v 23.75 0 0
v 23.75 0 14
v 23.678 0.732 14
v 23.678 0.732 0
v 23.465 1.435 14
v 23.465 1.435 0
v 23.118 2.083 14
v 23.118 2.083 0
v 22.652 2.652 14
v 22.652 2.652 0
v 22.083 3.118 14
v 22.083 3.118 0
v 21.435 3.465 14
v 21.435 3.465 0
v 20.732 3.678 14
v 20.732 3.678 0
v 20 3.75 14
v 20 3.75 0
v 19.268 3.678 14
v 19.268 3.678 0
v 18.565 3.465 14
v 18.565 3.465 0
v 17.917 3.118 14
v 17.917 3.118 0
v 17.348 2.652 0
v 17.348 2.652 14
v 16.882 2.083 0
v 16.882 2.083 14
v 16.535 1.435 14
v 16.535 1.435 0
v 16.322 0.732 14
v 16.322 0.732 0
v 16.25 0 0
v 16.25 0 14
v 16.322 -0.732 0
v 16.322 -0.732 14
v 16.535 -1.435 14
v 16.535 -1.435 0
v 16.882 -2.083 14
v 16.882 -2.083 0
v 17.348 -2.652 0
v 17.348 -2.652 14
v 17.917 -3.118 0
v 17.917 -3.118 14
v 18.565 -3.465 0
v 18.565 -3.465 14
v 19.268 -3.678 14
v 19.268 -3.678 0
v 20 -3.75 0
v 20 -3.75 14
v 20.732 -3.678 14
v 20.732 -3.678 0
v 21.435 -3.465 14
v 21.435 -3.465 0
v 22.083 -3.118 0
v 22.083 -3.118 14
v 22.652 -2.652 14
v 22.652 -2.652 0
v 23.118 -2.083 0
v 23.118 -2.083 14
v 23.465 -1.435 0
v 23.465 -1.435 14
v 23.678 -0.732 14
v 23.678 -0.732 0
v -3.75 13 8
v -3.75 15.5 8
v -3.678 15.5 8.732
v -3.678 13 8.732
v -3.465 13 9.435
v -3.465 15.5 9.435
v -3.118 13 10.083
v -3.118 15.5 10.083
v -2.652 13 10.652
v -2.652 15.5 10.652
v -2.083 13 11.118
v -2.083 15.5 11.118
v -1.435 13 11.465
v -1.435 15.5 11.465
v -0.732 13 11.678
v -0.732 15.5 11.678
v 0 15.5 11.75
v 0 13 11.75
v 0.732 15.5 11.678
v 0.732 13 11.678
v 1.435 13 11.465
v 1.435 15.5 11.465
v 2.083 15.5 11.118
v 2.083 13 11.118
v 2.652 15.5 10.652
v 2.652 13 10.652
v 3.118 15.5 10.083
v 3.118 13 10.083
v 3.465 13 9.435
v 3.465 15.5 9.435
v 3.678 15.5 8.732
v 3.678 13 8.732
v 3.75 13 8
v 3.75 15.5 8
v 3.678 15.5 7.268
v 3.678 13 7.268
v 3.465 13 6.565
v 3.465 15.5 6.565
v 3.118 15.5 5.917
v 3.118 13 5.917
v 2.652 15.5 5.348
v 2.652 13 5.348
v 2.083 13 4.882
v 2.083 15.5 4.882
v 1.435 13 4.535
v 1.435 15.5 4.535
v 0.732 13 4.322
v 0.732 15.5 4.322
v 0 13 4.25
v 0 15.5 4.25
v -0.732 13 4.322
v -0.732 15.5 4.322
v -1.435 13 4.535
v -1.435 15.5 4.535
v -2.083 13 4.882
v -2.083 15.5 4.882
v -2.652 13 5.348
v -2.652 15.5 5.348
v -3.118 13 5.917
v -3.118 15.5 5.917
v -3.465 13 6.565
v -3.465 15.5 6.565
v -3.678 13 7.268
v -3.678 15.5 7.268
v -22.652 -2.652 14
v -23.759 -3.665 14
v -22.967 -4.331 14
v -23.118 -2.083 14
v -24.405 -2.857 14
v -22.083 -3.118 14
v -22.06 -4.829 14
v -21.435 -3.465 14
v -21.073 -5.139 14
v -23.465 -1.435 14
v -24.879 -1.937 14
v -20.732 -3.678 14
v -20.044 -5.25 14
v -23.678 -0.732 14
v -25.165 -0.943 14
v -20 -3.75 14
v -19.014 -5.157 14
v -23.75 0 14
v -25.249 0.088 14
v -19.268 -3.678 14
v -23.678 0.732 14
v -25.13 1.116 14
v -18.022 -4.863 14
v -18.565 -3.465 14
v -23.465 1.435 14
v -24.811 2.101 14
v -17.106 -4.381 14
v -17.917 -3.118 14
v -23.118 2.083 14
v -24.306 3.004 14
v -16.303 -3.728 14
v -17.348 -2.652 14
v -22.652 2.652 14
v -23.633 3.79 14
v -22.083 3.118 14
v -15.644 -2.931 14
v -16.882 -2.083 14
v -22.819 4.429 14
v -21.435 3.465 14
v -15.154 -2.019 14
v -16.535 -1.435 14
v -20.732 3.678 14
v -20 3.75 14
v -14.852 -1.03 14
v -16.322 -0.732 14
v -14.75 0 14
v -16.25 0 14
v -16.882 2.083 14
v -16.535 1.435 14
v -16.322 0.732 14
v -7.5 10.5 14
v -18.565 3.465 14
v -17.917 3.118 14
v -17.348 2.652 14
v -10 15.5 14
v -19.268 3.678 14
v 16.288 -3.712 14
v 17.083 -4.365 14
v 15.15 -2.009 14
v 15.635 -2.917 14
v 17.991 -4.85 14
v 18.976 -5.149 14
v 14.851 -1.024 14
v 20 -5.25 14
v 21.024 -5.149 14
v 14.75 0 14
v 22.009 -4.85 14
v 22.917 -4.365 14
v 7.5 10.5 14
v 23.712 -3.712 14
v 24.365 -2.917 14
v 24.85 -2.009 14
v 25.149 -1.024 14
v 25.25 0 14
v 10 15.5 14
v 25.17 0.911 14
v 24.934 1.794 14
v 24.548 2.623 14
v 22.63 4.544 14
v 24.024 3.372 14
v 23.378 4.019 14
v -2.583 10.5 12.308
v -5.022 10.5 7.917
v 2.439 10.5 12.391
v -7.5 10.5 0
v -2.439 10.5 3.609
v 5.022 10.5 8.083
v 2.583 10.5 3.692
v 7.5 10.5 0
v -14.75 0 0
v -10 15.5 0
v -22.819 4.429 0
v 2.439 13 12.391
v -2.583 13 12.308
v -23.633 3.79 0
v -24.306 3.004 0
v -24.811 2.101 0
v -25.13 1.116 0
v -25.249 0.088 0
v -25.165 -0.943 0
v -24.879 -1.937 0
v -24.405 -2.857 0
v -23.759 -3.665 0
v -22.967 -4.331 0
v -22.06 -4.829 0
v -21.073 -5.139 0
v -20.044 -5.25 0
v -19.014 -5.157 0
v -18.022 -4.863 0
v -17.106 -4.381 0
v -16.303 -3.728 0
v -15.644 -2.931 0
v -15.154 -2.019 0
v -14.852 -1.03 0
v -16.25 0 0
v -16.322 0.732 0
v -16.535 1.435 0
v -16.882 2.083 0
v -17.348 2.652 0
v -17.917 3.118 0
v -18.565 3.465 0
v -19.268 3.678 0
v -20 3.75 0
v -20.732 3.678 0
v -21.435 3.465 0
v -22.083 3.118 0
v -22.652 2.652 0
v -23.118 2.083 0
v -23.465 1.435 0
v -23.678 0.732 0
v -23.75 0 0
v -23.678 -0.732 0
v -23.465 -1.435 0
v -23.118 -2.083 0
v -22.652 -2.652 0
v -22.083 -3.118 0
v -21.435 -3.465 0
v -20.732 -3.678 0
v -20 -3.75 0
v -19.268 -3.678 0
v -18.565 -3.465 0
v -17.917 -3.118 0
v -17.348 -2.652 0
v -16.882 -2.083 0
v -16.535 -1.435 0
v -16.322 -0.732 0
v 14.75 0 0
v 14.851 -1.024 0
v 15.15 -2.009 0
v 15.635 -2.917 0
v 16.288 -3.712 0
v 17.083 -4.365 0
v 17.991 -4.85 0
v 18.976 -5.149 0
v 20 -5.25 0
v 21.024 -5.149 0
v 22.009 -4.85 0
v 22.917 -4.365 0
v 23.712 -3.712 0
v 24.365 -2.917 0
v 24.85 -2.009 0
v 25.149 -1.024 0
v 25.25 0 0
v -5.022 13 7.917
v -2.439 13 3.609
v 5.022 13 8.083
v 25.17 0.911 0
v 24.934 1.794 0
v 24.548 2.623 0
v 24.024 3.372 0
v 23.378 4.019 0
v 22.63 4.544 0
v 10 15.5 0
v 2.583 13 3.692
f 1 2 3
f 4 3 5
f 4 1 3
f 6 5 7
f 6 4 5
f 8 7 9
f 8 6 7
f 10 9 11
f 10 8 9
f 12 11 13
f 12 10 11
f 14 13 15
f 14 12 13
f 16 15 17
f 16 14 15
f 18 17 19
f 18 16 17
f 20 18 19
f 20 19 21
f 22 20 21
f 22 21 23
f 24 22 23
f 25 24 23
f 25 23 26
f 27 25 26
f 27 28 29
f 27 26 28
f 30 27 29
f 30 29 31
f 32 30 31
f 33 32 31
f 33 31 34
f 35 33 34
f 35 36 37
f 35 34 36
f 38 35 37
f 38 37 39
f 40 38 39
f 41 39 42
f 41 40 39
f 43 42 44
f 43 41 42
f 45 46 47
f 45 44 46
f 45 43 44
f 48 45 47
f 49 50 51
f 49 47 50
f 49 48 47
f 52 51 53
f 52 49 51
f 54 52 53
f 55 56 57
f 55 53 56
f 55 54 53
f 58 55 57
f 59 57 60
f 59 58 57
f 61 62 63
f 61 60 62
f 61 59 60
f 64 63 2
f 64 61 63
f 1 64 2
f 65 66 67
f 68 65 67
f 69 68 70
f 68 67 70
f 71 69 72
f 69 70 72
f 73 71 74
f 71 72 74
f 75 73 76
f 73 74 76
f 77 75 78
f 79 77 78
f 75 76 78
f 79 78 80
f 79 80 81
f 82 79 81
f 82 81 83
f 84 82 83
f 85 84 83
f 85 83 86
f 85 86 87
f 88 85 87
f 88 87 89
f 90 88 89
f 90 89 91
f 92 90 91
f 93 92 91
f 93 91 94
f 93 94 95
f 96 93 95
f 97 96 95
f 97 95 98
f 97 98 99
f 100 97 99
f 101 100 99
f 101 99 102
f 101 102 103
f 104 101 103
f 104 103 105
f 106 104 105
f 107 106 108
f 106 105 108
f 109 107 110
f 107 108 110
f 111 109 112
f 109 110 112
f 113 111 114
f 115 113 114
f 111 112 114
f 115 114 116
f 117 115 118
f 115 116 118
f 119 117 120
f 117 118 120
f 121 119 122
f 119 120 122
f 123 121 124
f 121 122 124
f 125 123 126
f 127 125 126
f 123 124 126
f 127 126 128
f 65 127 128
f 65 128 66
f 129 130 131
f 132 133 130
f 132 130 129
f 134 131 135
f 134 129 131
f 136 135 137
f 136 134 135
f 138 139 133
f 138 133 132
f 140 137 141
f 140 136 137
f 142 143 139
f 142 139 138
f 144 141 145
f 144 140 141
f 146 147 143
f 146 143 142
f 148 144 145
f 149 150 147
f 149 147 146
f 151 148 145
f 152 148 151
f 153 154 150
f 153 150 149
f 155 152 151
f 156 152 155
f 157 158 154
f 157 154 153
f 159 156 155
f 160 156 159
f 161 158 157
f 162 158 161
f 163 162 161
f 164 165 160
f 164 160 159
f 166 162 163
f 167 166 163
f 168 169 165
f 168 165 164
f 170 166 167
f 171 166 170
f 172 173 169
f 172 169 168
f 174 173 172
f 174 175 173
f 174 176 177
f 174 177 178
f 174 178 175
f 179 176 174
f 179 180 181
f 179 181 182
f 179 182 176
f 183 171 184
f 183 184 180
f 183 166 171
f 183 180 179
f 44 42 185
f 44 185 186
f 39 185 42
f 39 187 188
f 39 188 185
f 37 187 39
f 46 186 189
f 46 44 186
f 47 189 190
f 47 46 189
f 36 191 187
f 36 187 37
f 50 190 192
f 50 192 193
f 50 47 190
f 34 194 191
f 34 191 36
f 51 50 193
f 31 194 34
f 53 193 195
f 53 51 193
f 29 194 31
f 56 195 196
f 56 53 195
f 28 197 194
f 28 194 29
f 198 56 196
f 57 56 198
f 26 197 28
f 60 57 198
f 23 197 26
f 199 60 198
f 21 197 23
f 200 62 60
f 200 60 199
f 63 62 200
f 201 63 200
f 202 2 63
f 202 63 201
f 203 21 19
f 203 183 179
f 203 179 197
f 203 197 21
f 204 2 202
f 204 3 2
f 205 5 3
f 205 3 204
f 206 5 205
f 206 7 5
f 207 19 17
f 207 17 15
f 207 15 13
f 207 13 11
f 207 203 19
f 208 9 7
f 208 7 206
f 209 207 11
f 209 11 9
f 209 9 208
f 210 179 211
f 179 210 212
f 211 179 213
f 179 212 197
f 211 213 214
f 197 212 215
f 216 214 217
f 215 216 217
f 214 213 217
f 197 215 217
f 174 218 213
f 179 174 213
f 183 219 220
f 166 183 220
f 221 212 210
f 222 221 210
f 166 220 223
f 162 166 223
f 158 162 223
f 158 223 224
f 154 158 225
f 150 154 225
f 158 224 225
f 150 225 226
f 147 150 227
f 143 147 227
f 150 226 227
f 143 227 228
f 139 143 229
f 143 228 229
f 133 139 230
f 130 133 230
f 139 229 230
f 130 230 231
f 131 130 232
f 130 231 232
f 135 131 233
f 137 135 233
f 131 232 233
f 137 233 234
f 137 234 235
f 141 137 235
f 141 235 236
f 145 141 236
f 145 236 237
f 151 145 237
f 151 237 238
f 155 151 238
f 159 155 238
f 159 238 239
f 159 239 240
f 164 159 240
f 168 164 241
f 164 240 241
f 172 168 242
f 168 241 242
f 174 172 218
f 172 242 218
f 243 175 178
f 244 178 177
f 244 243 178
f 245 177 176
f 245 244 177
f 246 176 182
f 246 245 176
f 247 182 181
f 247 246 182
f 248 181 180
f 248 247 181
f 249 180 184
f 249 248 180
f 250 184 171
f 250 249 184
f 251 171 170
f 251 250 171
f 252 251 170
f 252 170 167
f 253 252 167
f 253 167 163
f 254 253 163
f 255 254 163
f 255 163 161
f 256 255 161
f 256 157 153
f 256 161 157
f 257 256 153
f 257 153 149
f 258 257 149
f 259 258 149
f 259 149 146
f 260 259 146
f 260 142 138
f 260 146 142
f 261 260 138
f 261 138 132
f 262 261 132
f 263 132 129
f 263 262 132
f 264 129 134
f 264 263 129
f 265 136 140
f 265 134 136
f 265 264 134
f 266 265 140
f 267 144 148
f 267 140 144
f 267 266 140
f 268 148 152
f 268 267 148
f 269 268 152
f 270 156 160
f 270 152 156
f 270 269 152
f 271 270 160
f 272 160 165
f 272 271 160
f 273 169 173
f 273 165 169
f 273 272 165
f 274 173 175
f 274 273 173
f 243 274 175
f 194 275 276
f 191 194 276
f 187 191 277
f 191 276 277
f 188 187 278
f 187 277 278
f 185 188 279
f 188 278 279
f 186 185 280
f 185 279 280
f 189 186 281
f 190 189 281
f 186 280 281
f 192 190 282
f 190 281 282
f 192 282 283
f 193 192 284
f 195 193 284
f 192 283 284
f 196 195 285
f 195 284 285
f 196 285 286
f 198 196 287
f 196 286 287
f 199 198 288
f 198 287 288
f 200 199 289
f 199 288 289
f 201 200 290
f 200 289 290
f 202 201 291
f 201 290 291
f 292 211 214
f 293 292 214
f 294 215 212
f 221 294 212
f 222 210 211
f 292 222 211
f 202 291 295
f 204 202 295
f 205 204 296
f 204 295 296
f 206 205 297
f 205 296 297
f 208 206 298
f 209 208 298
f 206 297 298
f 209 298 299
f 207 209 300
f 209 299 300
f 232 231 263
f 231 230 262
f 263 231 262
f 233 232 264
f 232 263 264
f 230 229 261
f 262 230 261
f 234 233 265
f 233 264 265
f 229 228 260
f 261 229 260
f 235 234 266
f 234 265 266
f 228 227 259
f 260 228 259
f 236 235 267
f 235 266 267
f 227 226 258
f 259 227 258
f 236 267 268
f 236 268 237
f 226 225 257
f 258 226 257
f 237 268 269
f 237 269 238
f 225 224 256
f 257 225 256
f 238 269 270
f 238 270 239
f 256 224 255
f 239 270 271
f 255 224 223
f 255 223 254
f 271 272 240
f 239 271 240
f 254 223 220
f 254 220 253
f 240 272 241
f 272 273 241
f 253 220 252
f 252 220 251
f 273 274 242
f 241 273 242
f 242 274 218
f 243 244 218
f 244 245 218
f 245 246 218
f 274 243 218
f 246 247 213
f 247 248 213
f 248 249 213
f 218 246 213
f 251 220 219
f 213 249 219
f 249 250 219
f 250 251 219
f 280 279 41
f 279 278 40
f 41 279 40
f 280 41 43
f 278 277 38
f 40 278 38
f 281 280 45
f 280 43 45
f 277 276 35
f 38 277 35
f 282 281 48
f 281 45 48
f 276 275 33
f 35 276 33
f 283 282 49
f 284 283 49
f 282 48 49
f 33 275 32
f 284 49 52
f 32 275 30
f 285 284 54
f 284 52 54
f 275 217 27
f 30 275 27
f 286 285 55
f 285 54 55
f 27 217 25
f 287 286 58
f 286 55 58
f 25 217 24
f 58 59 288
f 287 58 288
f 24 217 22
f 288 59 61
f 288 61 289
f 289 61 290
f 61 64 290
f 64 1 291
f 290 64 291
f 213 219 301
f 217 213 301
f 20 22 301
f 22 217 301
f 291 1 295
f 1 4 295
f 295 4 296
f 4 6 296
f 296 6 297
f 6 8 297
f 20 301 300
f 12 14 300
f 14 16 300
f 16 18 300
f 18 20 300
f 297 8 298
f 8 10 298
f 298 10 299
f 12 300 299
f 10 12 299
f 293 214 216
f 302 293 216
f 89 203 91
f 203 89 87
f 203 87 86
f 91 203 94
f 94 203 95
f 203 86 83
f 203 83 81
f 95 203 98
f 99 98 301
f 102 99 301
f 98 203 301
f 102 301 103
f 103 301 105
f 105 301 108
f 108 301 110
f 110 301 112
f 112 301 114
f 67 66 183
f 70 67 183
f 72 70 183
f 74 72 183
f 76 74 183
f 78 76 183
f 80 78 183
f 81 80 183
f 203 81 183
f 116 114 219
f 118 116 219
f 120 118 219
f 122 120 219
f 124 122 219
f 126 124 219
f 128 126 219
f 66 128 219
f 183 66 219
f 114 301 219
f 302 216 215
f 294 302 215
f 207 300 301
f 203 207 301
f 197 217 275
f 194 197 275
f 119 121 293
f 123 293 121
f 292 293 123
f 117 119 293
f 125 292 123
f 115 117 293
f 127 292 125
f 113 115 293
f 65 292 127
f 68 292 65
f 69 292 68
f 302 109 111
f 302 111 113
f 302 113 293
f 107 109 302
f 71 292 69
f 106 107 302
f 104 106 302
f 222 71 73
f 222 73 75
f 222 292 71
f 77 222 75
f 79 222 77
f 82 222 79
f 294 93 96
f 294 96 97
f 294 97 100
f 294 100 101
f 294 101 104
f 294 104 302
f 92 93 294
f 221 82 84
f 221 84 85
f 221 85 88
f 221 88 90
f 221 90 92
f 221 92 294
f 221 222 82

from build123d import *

# Parameters (mm, degrees)
F0_R     = 3.75
F2_DEPTH = 25
F3_DEPTH = 14
F4_R     = 3.75
F6_DEPTH = 25
F7_DEPTH = 2.5


with BuildPart() as f2:
    # F0 (on Top) → F2 (new body)
    with BuildSketch(Plane.XY):
        with Locations((-20, 0)):
            Circle(F0_R)
        with Locations((20, 0)):
            Circle(F0_R)
    extrude(amount=F2_DEPTH)


with BuildPart() as f3:
    # F1 (on Top) → F3 (new body)
    with BuildSketch(Plane.XY):
        with BuildLine():
            ThreePointArc((-22.819472, 4.428666), (-22.525893, -4.60243), (-14.75, 0))
            ThreePointArc((-14.75, 0), (-17.474107, 4.60243), (-22.819472, 4.428666))
        make_face()
        with BuildLine():
            ThreePointArc((-22.819472, 4.428666), (-17.474107, 4.60243), (-14.75, 0))
            Line((-14.75, 0), (-7.5, 10.5))
            Line((-7.5, 10.5), (7.5, 10.5))
            Line((7.5, 10.5), (14.75, 0))
            ThreePointArc((14.75, 0), (17.377467, 4.548057), (22.629931, 4.543783))
            Line((22.629931, 4.543783), (10, 15.5))
            Line((10, 15.5), (-10, 15.5))
            Line((-10, 15.5), (-22.819472, 4.428666))
        make_face()
        with BuildLine():
            ThreePointArc((22.629931, 4.543783), (17.377467, 4.548057), (14.75, 0))
            ThreePointArc((14.75, 0), (20, -5.25), (25.25, 0))
            ThreePointArc((25.25, 0), (24.548057, 2.622533), (22.629931, 4.543783))
        make_face()
    extrude(amount=F3_DEPTH)


with BuildPart() as f6:
    # F4 (on face) → F6 (new body)
    with BuildSketch(Plane(origin=(0, 15.5, 0), x_dir=(-1, 0, 0), z_dir=(0, 1, 0))):
        with Locations((0, 8)):
            Circle(F4_R)
    extrude(amount=-F6_DEPTH)


with BuildPart() as f7:
    # F5 (on face) → F7 (new body)
    with BuildSketch(Plane.XZ.offset(-10.5)):
        Polygon((2.582829, 3.691985), (5.022265, 8.082788), (2.439436, 12.390803), (-2.582829, 12.308015), (-5.022265, 7.917212), (-2.439436, 3.609197), align=None)
    extrude(amount=-F7_DEPTH)


with BuildPart() as f3_1:
    add(f3.part)

    # F8: cut F2, F6, F7
    add(f2.part, mode=Mode.SUBTRACT)
    add(f6.part, mode=Mode.SUBTRACT)
    add(f7.part, mode=Mode.SUBTRACT)


solid = f3_1.part
